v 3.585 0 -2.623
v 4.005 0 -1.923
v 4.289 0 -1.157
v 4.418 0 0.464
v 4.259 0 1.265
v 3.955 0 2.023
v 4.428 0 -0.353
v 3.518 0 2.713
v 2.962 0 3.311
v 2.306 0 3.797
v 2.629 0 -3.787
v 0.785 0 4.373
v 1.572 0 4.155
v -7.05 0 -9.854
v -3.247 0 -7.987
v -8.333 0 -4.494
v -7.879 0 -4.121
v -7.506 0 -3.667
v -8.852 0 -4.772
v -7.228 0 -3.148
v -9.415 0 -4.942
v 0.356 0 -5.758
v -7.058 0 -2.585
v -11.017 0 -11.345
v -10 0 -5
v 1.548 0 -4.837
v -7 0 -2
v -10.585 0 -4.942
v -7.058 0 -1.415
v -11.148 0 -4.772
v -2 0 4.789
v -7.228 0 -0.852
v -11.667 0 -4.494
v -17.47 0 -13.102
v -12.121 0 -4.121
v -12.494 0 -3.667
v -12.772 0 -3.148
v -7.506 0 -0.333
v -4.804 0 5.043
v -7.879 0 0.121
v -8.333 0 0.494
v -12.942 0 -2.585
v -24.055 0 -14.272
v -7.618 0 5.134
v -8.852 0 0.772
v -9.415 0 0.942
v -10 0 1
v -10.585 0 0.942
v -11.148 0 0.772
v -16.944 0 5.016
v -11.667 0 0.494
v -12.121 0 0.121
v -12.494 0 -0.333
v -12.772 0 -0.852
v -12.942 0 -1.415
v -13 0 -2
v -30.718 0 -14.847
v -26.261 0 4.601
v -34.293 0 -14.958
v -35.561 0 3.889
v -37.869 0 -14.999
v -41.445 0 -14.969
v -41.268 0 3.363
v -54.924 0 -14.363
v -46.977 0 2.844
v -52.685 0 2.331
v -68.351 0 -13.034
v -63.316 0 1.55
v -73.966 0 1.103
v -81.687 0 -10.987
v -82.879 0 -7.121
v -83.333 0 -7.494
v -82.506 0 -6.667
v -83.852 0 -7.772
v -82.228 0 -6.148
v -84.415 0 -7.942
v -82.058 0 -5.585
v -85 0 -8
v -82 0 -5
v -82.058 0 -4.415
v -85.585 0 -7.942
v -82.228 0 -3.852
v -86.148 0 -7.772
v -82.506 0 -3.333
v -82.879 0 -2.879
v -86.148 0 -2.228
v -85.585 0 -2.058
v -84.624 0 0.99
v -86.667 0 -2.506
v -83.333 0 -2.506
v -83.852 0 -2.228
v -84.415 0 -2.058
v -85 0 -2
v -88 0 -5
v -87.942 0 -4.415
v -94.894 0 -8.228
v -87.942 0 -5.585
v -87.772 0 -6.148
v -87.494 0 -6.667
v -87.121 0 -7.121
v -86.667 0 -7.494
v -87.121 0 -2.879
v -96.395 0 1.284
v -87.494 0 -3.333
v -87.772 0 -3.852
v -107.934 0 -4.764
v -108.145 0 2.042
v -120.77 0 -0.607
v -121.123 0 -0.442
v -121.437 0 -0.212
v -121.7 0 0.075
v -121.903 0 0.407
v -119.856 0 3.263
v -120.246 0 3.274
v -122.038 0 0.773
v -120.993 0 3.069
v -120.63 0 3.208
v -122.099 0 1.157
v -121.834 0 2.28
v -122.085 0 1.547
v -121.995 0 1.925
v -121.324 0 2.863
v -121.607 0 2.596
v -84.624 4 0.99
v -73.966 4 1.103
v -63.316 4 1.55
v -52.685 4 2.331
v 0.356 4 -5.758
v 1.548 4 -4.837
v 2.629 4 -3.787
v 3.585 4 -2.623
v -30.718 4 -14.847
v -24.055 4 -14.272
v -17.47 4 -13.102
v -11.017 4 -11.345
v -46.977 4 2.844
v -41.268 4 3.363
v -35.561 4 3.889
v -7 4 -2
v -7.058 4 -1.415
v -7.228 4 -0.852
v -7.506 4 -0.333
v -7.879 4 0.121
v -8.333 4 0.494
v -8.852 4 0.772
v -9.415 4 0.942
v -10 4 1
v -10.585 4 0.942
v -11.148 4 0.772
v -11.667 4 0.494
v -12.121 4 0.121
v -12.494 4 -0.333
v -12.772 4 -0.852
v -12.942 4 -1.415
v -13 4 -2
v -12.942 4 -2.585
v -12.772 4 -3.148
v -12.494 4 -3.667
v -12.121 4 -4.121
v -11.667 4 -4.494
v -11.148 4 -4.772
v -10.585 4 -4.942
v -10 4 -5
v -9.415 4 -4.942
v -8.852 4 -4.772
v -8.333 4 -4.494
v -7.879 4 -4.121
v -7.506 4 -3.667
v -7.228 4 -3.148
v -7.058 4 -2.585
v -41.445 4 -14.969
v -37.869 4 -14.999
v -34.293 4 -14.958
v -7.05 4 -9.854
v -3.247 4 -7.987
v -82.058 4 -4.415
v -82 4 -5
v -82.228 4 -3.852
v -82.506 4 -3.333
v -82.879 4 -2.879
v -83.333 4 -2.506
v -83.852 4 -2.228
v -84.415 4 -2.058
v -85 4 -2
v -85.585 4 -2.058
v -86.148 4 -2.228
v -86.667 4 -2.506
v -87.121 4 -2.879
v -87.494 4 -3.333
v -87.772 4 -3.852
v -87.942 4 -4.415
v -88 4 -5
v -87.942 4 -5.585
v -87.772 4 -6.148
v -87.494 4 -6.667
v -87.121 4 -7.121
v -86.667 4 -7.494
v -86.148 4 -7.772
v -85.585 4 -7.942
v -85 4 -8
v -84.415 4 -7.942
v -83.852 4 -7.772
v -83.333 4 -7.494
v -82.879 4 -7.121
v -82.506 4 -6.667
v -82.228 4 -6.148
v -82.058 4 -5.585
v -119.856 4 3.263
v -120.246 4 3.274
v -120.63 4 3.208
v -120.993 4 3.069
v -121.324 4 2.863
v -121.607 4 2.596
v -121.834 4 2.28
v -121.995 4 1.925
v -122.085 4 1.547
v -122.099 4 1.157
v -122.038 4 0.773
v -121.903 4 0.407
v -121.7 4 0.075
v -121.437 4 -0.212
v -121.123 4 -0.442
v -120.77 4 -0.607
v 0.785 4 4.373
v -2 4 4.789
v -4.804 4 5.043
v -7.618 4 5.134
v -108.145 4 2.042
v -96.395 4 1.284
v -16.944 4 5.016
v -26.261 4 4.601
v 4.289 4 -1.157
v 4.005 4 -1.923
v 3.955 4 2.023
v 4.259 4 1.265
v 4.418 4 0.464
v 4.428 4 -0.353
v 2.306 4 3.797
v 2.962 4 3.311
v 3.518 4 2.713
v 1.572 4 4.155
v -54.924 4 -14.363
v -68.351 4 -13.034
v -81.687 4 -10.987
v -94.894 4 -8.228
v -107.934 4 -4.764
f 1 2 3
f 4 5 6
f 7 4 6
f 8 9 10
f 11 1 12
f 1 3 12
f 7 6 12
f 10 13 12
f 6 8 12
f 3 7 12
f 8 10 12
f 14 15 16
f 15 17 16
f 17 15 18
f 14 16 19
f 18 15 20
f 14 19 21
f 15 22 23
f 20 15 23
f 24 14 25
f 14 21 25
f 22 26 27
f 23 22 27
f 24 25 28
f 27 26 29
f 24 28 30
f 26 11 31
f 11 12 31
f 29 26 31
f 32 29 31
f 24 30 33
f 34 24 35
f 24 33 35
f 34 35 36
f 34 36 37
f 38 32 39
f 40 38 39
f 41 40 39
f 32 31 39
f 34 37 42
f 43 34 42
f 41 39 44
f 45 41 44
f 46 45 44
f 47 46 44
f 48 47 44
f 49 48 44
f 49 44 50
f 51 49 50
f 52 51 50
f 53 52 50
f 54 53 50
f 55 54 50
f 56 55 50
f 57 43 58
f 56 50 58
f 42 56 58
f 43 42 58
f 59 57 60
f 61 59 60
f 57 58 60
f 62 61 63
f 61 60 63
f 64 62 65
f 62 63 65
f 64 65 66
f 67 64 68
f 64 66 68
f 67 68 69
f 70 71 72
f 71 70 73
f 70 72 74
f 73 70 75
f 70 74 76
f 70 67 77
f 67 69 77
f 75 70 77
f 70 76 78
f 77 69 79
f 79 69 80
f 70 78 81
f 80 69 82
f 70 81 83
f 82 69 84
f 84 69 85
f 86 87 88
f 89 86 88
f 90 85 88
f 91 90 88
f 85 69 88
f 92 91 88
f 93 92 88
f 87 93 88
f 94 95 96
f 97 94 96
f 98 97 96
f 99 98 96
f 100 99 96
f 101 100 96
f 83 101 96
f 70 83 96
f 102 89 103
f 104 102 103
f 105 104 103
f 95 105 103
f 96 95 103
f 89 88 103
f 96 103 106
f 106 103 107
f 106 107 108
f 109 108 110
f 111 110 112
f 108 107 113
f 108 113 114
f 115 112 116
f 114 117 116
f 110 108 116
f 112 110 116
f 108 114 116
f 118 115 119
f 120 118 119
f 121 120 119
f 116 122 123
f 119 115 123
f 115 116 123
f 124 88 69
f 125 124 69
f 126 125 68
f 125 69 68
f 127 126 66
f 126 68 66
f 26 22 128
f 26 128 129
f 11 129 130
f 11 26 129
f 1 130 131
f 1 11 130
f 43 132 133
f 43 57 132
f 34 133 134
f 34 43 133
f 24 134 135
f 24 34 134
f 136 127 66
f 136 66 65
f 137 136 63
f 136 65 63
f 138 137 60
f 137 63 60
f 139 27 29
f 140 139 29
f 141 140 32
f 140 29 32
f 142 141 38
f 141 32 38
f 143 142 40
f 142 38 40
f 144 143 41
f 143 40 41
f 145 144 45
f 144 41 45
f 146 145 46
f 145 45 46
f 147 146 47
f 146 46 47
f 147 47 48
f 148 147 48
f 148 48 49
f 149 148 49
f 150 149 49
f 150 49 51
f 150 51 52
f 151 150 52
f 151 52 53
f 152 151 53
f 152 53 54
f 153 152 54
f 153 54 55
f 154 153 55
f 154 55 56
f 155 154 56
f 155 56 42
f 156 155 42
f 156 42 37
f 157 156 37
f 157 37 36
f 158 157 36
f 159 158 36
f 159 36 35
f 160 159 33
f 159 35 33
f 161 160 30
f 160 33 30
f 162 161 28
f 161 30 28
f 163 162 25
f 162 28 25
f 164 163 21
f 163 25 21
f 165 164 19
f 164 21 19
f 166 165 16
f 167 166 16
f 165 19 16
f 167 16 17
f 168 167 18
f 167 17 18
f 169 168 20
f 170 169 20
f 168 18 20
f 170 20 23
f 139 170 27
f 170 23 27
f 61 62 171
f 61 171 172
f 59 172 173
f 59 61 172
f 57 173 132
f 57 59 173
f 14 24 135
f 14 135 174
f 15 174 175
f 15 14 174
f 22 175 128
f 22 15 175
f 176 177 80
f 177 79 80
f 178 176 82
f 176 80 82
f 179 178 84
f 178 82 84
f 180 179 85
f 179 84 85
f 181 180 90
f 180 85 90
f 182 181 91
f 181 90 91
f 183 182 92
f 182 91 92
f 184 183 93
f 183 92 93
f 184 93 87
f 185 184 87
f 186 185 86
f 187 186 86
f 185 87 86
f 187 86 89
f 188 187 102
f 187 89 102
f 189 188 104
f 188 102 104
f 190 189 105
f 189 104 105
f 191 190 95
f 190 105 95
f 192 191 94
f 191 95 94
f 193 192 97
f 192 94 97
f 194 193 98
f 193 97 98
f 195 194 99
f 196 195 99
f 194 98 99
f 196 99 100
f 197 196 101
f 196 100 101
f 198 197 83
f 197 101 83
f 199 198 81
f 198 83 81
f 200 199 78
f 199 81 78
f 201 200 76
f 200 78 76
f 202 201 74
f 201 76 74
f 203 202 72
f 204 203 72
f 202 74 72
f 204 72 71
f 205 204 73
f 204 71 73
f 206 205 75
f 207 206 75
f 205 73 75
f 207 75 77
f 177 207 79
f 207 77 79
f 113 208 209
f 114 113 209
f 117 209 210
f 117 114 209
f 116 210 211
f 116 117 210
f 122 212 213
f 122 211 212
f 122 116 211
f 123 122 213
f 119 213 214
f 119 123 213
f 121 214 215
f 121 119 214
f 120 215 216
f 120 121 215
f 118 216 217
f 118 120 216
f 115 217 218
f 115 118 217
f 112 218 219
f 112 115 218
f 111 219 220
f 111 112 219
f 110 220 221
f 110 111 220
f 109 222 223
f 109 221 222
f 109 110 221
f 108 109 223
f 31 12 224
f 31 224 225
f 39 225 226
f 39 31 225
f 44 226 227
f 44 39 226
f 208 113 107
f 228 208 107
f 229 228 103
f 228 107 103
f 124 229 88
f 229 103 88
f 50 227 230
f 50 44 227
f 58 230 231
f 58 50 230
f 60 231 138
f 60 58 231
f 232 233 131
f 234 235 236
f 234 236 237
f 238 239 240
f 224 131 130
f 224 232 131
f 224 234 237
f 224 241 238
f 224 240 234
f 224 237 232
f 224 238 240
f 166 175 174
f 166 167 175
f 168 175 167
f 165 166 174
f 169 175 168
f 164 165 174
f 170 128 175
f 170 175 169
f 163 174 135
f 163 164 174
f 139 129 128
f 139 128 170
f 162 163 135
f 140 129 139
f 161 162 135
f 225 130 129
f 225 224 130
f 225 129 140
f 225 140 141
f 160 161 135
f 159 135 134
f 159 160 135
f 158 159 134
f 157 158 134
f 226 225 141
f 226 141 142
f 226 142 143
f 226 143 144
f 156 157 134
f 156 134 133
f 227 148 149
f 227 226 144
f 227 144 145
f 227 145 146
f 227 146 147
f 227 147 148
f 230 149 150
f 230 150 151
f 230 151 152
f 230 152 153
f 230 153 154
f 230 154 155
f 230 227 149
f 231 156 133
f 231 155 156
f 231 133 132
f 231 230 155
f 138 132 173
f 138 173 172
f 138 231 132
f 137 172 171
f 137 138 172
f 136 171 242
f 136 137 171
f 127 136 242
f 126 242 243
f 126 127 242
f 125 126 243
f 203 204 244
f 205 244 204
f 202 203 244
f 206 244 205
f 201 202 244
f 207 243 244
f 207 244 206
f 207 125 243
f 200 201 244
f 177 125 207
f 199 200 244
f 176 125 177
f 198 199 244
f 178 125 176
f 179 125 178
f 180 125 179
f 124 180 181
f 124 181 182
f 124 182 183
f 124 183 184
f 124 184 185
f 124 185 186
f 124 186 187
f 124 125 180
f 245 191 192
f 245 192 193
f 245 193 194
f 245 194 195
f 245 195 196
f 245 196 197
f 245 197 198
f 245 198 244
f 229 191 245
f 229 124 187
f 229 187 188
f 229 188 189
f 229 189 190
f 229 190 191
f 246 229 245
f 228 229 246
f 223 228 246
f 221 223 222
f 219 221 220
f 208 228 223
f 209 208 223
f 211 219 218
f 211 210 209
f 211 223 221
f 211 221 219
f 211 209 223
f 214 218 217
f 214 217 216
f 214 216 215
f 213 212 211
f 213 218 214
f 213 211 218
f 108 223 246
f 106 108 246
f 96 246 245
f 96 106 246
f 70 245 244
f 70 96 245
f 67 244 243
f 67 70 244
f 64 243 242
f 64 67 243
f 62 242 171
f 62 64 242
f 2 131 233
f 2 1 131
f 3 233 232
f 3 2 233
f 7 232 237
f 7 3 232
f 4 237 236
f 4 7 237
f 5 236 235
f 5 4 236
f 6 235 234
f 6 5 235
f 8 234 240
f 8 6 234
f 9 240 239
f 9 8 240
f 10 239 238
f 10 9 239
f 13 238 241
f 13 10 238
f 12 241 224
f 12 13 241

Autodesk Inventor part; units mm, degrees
ref_plane "YZ Plane" through (0, 0, 0) normal (1, 0, 0) x (0, 1, 0)
ref_plane "XZ Plane" through (0, 0, 0) normal (0, 1, 0) x (-1, 0, 0)
ref_plane "XY Plane" through (0, 0, 0) normal (0, 0, 1) x (1, 0, 0)
sketch "スケッチ1" plane through (0, 0, 0) normal (0, 1, 0) x (-1, 0, 0)
  arc A0 (120.7701, -0.6068) -> (119.8564, 3.2634) centre (120.103, 1.2786) ccw projected
  arc A1 (41.4452, -14.9694) -> (120.7701, -0.6068) centre (36.8758, 236.5065) ccw projected
  arc A2 (30.7183, -14.8468) -> (41.4452, -14.9694) centre (38.1525, 166.2425) ccw projected
  arc A3 (11.0166, -11.3447) -> (30.7183, -14.8468) centre (33.77, 59.49) ccw projected
  arc A4 (-0.3565, -5.7585) -> (11.0166, -11.3447) centre (24.3575, 30.1875) ccw projected
  arc A5 (-3.5852, -2.6234) -> (-0.3565, -5.7585) centre (7.25, 5.305) ccw projected
  arc A6 (-0.7848, 4.3726) -> (-3.5852, -2.6234) centre (0, 0) ccw projected
  arc A7 (7.6183, 5.1344) -> (-0.7848, 4.3726) centre (7.775, -43.32) ccw projected
  arc A8 (35.5607, 3.8888) -> (7.6183, 5.1344) centre (8.565, -287.665) ccw projected
  arc A9 (35.5607, 3.8888) -> (52.6853, 2.3311) centre (526.9475, 5310.875) ccw projected
  arc A10 (52.6853, 2.3311) -> (84.6244, 0.9905) centre (82.86, 340.0849) ccw projected
  arc A11 (84.6244, 0.9905) -> (119.8564, 3.2634) centre (83.0725, 299.245) ccw projected
extrude "押し出し1" add sketch "スケッチ1" along normal blind 4
sketch "スケッチ2" plane through (0, 0, 0) normal (0, -1, 0) x (1, 0, 0)
  circle A0 centre (-10, -2) radius 3
  circle A1 centre (-85, -5) radius 3
  point P0 (0, 0)
  dimension "d3" = 6
  dimension "d4" = 6
  dimension "d5" = 10
  dimension "d6" = 2
  dimension "d7" = 5
  dimension "d8" = 85
extrude "押し出し2" cut sketch "スケッチ2" against normal through all
equation "\"d4\" = d3"
properties part number "plate_sf2" material "木材 (オーク)"
